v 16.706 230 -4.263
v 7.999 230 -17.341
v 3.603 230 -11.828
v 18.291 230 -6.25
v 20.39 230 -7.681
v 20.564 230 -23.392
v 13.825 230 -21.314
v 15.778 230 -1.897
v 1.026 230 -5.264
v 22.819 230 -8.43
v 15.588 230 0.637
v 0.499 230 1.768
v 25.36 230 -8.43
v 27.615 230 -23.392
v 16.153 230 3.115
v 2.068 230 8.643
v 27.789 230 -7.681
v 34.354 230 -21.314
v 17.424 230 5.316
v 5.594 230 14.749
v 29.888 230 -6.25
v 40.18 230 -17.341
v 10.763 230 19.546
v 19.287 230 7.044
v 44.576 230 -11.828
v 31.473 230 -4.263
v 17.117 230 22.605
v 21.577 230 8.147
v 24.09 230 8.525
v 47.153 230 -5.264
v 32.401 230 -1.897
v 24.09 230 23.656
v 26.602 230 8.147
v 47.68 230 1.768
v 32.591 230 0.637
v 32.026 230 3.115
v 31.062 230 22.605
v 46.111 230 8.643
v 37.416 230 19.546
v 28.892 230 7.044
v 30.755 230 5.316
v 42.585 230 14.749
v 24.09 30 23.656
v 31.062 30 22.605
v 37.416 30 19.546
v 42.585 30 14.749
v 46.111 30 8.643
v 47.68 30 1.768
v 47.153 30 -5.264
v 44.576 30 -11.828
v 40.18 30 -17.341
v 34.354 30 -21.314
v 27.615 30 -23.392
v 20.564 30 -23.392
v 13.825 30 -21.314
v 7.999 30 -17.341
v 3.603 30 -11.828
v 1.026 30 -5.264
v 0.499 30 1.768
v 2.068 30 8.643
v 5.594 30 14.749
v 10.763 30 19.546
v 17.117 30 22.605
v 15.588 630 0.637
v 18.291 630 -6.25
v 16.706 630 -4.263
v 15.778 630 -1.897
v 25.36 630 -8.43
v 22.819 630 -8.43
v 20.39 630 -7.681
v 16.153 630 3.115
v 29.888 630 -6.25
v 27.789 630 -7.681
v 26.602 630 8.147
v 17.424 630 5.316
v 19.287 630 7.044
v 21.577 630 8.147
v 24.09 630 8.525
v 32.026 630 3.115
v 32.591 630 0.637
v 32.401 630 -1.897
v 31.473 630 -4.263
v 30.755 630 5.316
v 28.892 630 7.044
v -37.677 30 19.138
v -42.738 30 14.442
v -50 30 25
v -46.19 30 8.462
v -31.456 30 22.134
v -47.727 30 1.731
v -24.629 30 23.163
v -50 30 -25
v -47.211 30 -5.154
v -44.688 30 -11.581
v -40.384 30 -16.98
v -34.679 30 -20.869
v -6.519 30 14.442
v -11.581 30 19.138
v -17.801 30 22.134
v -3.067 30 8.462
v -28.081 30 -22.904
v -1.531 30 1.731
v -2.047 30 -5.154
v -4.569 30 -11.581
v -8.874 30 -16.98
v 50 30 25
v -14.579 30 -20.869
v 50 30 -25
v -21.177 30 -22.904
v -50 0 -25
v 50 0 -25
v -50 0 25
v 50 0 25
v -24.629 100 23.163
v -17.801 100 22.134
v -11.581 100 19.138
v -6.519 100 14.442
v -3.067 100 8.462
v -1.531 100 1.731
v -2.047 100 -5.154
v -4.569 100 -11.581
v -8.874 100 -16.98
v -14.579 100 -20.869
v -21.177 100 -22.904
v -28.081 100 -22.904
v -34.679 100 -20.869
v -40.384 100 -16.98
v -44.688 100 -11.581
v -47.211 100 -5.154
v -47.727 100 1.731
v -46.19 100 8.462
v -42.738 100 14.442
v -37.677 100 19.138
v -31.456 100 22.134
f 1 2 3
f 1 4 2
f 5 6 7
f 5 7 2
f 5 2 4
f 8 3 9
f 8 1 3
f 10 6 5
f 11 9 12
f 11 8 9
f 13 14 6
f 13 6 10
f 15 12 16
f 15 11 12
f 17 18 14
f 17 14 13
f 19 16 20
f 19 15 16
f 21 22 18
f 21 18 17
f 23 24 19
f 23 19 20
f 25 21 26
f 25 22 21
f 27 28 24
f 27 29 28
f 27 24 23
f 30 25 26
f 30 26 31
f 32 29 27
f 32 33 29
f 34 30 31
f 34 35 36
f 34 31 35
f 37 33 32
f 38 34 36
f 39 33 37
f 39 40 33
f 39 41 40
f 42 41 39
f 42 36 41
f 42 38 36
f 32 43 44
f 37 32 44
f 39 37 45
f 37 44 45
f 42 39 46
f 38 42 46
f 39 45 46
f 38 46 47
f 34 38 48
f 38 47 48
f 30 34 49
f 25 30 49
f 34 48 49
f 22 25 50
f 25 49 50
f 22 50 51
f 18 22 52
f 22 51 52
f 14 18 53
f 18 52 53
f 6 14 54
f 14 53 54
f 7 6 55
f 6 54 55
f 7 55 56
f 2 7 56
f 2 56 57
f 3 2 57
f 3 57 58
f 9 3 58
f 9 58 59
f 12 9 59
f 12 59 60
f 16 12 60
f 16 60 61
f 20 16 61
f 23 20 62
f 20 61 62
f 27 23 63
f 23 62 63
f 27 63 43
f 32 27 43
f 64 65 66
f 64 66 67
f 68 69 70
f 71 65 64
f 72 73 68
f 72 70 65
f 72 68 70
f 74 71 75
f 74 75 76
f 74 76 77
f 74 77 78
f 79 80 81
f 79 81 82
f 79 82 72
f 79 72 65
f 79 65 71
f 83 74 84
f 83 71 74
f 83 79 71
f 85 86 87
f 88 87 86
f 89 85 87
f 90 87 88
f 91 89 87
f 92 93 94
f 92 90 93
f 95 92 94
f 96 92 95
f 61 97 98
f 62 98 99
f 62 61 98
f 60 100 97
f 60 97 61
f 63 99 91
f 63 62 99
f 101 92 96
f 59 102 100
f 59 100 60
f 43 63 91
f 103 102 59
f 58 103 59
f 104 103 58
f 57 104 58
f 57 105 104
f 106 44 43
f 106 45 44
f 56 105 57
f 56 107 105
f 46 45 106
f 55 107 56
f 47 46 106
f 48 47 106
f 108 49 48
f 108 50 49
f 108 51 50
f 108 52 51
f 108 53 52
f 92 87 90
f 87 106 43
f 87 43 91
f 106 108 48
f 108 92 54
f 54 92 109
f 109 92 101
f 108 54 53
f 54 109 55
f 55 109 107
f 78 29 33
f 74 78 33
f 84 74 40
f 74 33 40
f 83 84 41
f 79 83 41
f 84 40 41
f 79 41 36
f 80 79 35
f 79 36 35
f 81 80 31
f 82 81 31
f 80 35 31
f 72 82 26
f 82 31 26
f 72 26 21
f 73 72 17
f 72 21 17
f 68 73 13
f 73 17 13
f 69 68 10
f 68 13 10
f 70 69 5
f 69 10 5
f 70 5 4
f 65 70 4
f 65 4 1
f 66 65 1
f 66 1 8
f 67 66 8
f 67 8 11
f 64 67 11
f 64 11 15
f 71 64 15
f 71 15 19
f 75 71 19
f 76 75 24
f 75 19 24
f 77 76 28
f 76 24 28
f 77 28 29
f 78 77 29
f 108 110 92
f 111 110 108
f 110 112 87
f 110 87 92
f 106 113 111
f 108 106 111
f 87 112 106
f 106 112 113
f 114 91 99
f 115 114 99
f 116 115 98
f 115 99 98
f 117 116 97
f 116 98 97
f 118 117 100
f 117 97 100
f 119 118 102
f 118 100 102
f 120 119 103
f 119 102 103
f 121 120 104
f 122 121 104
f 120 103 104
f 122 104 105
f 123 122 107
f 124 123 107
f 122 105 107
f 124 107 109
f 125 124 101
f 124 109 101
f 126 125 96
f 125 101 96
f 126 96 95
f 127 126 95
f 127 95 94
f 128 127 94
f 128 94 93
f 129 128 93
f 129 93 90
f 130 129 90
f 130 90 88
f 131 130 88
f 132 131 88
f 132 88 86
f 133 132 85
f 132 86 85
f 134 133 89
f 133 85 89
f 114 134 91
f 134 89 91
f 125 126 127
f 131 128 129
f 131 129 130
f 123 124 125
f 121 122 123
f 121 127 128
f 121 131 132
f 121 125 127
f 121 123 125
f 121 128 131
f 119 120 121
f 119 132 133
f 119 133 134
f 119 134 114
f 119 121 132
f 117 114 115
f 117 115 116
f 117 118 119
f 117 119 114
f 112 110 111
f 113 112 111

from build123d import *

# Parameters (mm, degrees)
SKETCH1_W           = 100
SKETCH1_H           = 50
BOSS_EXTRUDE1_DEPTH = 30
SKETCH3_R           = 23.162771803
BOSS_EXTRUDE2_DEPTH = 70
SKETCH4_R           = 23.656320331
BOSS_EXTRUDE3_DEPTH = 200
SKETCH5_R           = 8.525466093
BOSS_EXTRUDE4_DEPTH = 400


with BuildPart() as part:
    # Sketch1 → Boss-Extrude1 (new body)
    with BuildSketch(Plane(origin=(0, 0, 0), x_dir=(1, 0, 0), z_dir=(0, 1, 0))):
        Rectangle(SKETCH1_W, SKETCH1_H)
    extrude(amount=BOSS_EXTRUDE1_DEPTH)

    # Sketch3 → Boss-Extrude2 (add)
    with BuildSketch(Plane(origin=(0, 30, 0), x_dir=(1, 0, 0), z_dir=(0, 1, 0))):
        with Locations(Location((-24.62884077, 0, 0), (0, 0, 270))):
            Circle(SKETCH3_R)
    extrude(amount=BOSS_EXTRUDE2_DEPTH)

    # Sketch4 → Boss-Extrude3 (add)
    with BuildSketch(Plane(origin=(0, 30, 0), x_dir=(1, 0, 0), z_dir=(0, 1, 0))):
        with Locations(Location((24.089523089, 0, 0), (0, 0, 270))):
            Circle(SKETCH4_R)
    extrude(amount=BOSS_EXTRUDE3_DEPTH)

    # Sketch5 → Boss-Extrude4 (add)
    with BuildSketch(Plane(origin=(0, 230, 0), x_dir=(1, 0, 0), z_dir=(0, 1, 0))):
        with Locations(Location((24.089523089, 0, 0), (0, 0, 270))):
            Circle(SKETCH5_R)
    extrude(amount=BOSS_EXTRUDE4_DEPTH)


solid = part.part
